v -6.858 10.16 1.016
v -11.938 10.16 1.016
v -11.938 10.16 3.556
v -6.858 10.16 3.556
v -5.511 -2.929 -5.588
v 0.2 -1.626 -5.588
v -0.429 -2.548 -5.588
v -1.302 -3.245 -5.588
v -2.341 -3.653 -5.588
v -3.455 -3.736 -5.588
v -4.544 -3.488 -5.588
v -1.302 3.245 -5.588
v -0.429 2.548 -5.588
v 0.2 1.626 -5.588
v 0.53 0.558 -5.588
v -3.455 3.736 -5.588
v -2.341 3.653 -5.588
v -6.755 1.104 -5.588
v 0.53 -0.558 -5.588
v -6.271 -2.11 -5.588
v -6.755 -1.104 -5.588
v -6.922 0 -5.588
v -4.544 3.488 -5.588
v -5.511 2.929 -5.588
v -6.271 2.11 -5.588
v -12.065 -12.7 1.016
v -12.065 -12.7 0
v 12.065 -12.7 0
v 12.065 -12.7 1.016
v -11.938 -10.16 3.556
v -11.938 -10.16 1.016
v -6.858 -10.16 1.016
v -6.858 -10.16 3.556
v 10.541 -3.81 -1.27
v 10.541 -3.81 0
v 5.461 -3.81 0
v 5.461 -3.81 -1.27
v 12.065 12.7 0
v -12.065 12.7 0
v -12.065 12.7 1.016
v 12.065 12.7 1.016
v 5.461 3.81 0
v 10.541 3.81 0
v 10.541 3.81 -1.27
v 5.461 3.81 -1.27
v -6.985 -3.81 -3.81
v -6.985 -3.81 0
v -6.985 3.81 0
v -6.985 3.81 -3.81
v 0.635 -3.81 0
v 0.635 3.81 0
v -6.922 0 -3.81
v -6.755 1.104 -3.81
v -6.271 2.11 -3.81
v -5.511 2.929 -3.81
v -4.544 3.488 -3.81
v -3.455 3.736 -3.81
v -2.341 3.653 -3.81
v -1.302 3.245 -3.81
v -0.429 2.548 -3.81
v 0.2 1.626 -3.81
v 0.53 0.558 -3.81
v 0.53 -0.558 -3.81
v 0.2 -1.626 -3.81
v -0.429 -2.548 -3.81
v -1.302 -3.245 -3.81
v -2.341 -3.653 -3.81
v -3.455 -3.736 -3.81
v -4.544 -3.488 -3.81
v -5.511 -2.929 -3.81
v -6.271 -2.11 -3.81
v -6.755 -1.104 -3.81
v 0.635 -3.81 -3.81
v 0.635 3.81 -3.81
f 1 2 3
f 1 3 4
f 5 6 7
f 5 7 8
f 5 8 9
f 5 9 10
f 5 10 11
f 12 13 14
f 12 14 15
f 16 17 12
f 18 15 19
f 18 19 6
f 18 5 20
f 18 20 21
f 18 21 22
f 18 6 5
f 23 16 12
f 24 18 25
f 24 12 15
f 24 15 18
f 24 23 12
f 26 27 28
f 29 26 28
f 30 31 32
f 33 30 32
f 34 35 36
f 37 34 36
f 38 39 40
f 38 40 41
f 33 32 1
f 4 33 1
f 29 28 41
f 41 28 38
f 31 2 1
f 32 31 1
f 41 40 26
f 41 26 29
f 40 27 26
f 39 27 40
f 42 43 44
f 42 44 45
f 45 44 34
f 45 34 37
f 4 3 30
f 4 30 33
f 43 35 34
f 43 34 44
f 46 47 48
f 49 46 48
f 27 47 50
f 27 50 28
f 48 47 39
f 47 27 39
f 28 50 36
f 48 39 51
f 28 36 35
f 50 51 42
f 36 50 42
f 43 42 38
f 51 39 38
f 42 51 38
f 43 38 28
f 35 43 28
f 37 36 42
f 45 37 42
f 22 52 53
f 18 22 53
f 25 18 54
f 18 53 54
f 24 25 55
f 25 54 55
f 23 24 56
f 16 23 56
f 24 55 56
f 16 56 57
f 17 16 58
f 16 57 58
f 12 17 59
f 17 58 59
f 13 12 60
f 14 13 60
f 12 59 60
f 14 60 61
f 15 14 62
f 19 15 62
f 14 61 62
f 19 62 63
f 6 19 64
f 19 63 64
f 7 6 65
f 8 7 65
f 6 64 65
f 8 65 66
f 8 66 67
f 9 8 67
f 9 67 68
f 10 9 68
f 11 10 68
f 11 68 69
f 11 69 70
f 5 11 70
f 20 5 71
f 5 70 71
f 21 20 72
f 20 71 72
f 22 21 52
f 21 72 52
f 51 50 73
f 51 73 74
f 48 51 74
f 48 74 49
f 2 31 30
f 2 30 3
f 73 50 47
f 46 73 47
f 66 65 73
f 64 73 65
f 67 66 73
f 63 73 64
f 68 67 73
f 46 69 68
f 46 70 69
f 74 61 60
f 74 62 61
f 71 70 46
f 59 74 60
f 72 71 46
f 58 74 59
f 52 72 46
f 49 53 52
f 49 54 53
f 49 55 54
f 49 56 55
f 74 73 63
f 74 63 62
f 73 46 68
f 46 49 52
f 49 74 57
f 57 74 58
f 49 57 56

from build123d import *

# Parameters (mm, degrees)
SKETCH1_W           = 24.13
SKETCH1_H           = 25.4
BOSS_EXTRUDE1_DEPTH = 1.016
SKETCH2_W           = 5.08
SKETCH2_H           = 20.32
BOSS_EXTRUDE2_DEPTH = 2.54
SKETCH3_W           = 7.62
SKETCH3_H           = 7.62
BOSS_EXTRUDE3_DEPTH = 3.81
SKETCH5_R           = 3.7465
BOSS_EXTRUDE4_DEPTH = 1.778
SKETCH6_W           = 5.08
SKETCH6_H           = 7.62
BOSS_EXTRUDE5_DEPTH = 1.27


with BuildPart() as part:
    # Sketch1 → Boss-Extrude1 (new body)
    with BuildSketch(Plane.XY):
        Rectangle(SKETCH1_W, SKETCH1_H)
    extrude(amount=BOSS_EXTRUDE1_DEPTH)

    # Sketch3 → Boss-Extrude3 (add)
    with BuildSketch(Plane(origin=(0, 0, 0), x_dir=(-1, 0, 0), z_dir=(0, 0, -1))):
        with Locations((3.175, 0)):
            Rectangle(SKETCH3_W, SKETCH3_H)
    extrude(amount=BOSS_EXTRUDE3_DEPTH)

    # Sketch5 → Boss-Extrude4 (add)
    with BuildSketch(Plane(origin=(0, 0, -3.81), x_dir=(-1, 0, 0), z_dir=(0, 0, -1))):
        with Locations((3.175, 0)):
            Circle(SKETCH5_R)
    extrude(amount=BOSS_EXTRUDE4_DEPTH)

    # Sketch6 → Boss-Extrude5 (add)
    with BuildSketch(Plane(origin=(0, 0, 0), x_dir=(-1, 0, 0), z_dir=(0, 0, -1))):
        with Locations((-8.001, 0)):
            Rectangle(SKETCH6_W, SKETCH6_H)
    extrude(amount=BOSS_EXTRUDE5_DEPTH)


with BuildPart() as body_2:
    # Sketch2 → Boss-Extrude2 (new body)
    with BuildSketch(Plane.XY.offset(1.016)):
        with Locations((-9.398, 0)):
            Rectangle(SKETCH2_W, SKETCH2_H)
    extrude(amount=BOSS_EXTRUDE2_DEPTH)


solid = Compound([part.part, body_2.part])
